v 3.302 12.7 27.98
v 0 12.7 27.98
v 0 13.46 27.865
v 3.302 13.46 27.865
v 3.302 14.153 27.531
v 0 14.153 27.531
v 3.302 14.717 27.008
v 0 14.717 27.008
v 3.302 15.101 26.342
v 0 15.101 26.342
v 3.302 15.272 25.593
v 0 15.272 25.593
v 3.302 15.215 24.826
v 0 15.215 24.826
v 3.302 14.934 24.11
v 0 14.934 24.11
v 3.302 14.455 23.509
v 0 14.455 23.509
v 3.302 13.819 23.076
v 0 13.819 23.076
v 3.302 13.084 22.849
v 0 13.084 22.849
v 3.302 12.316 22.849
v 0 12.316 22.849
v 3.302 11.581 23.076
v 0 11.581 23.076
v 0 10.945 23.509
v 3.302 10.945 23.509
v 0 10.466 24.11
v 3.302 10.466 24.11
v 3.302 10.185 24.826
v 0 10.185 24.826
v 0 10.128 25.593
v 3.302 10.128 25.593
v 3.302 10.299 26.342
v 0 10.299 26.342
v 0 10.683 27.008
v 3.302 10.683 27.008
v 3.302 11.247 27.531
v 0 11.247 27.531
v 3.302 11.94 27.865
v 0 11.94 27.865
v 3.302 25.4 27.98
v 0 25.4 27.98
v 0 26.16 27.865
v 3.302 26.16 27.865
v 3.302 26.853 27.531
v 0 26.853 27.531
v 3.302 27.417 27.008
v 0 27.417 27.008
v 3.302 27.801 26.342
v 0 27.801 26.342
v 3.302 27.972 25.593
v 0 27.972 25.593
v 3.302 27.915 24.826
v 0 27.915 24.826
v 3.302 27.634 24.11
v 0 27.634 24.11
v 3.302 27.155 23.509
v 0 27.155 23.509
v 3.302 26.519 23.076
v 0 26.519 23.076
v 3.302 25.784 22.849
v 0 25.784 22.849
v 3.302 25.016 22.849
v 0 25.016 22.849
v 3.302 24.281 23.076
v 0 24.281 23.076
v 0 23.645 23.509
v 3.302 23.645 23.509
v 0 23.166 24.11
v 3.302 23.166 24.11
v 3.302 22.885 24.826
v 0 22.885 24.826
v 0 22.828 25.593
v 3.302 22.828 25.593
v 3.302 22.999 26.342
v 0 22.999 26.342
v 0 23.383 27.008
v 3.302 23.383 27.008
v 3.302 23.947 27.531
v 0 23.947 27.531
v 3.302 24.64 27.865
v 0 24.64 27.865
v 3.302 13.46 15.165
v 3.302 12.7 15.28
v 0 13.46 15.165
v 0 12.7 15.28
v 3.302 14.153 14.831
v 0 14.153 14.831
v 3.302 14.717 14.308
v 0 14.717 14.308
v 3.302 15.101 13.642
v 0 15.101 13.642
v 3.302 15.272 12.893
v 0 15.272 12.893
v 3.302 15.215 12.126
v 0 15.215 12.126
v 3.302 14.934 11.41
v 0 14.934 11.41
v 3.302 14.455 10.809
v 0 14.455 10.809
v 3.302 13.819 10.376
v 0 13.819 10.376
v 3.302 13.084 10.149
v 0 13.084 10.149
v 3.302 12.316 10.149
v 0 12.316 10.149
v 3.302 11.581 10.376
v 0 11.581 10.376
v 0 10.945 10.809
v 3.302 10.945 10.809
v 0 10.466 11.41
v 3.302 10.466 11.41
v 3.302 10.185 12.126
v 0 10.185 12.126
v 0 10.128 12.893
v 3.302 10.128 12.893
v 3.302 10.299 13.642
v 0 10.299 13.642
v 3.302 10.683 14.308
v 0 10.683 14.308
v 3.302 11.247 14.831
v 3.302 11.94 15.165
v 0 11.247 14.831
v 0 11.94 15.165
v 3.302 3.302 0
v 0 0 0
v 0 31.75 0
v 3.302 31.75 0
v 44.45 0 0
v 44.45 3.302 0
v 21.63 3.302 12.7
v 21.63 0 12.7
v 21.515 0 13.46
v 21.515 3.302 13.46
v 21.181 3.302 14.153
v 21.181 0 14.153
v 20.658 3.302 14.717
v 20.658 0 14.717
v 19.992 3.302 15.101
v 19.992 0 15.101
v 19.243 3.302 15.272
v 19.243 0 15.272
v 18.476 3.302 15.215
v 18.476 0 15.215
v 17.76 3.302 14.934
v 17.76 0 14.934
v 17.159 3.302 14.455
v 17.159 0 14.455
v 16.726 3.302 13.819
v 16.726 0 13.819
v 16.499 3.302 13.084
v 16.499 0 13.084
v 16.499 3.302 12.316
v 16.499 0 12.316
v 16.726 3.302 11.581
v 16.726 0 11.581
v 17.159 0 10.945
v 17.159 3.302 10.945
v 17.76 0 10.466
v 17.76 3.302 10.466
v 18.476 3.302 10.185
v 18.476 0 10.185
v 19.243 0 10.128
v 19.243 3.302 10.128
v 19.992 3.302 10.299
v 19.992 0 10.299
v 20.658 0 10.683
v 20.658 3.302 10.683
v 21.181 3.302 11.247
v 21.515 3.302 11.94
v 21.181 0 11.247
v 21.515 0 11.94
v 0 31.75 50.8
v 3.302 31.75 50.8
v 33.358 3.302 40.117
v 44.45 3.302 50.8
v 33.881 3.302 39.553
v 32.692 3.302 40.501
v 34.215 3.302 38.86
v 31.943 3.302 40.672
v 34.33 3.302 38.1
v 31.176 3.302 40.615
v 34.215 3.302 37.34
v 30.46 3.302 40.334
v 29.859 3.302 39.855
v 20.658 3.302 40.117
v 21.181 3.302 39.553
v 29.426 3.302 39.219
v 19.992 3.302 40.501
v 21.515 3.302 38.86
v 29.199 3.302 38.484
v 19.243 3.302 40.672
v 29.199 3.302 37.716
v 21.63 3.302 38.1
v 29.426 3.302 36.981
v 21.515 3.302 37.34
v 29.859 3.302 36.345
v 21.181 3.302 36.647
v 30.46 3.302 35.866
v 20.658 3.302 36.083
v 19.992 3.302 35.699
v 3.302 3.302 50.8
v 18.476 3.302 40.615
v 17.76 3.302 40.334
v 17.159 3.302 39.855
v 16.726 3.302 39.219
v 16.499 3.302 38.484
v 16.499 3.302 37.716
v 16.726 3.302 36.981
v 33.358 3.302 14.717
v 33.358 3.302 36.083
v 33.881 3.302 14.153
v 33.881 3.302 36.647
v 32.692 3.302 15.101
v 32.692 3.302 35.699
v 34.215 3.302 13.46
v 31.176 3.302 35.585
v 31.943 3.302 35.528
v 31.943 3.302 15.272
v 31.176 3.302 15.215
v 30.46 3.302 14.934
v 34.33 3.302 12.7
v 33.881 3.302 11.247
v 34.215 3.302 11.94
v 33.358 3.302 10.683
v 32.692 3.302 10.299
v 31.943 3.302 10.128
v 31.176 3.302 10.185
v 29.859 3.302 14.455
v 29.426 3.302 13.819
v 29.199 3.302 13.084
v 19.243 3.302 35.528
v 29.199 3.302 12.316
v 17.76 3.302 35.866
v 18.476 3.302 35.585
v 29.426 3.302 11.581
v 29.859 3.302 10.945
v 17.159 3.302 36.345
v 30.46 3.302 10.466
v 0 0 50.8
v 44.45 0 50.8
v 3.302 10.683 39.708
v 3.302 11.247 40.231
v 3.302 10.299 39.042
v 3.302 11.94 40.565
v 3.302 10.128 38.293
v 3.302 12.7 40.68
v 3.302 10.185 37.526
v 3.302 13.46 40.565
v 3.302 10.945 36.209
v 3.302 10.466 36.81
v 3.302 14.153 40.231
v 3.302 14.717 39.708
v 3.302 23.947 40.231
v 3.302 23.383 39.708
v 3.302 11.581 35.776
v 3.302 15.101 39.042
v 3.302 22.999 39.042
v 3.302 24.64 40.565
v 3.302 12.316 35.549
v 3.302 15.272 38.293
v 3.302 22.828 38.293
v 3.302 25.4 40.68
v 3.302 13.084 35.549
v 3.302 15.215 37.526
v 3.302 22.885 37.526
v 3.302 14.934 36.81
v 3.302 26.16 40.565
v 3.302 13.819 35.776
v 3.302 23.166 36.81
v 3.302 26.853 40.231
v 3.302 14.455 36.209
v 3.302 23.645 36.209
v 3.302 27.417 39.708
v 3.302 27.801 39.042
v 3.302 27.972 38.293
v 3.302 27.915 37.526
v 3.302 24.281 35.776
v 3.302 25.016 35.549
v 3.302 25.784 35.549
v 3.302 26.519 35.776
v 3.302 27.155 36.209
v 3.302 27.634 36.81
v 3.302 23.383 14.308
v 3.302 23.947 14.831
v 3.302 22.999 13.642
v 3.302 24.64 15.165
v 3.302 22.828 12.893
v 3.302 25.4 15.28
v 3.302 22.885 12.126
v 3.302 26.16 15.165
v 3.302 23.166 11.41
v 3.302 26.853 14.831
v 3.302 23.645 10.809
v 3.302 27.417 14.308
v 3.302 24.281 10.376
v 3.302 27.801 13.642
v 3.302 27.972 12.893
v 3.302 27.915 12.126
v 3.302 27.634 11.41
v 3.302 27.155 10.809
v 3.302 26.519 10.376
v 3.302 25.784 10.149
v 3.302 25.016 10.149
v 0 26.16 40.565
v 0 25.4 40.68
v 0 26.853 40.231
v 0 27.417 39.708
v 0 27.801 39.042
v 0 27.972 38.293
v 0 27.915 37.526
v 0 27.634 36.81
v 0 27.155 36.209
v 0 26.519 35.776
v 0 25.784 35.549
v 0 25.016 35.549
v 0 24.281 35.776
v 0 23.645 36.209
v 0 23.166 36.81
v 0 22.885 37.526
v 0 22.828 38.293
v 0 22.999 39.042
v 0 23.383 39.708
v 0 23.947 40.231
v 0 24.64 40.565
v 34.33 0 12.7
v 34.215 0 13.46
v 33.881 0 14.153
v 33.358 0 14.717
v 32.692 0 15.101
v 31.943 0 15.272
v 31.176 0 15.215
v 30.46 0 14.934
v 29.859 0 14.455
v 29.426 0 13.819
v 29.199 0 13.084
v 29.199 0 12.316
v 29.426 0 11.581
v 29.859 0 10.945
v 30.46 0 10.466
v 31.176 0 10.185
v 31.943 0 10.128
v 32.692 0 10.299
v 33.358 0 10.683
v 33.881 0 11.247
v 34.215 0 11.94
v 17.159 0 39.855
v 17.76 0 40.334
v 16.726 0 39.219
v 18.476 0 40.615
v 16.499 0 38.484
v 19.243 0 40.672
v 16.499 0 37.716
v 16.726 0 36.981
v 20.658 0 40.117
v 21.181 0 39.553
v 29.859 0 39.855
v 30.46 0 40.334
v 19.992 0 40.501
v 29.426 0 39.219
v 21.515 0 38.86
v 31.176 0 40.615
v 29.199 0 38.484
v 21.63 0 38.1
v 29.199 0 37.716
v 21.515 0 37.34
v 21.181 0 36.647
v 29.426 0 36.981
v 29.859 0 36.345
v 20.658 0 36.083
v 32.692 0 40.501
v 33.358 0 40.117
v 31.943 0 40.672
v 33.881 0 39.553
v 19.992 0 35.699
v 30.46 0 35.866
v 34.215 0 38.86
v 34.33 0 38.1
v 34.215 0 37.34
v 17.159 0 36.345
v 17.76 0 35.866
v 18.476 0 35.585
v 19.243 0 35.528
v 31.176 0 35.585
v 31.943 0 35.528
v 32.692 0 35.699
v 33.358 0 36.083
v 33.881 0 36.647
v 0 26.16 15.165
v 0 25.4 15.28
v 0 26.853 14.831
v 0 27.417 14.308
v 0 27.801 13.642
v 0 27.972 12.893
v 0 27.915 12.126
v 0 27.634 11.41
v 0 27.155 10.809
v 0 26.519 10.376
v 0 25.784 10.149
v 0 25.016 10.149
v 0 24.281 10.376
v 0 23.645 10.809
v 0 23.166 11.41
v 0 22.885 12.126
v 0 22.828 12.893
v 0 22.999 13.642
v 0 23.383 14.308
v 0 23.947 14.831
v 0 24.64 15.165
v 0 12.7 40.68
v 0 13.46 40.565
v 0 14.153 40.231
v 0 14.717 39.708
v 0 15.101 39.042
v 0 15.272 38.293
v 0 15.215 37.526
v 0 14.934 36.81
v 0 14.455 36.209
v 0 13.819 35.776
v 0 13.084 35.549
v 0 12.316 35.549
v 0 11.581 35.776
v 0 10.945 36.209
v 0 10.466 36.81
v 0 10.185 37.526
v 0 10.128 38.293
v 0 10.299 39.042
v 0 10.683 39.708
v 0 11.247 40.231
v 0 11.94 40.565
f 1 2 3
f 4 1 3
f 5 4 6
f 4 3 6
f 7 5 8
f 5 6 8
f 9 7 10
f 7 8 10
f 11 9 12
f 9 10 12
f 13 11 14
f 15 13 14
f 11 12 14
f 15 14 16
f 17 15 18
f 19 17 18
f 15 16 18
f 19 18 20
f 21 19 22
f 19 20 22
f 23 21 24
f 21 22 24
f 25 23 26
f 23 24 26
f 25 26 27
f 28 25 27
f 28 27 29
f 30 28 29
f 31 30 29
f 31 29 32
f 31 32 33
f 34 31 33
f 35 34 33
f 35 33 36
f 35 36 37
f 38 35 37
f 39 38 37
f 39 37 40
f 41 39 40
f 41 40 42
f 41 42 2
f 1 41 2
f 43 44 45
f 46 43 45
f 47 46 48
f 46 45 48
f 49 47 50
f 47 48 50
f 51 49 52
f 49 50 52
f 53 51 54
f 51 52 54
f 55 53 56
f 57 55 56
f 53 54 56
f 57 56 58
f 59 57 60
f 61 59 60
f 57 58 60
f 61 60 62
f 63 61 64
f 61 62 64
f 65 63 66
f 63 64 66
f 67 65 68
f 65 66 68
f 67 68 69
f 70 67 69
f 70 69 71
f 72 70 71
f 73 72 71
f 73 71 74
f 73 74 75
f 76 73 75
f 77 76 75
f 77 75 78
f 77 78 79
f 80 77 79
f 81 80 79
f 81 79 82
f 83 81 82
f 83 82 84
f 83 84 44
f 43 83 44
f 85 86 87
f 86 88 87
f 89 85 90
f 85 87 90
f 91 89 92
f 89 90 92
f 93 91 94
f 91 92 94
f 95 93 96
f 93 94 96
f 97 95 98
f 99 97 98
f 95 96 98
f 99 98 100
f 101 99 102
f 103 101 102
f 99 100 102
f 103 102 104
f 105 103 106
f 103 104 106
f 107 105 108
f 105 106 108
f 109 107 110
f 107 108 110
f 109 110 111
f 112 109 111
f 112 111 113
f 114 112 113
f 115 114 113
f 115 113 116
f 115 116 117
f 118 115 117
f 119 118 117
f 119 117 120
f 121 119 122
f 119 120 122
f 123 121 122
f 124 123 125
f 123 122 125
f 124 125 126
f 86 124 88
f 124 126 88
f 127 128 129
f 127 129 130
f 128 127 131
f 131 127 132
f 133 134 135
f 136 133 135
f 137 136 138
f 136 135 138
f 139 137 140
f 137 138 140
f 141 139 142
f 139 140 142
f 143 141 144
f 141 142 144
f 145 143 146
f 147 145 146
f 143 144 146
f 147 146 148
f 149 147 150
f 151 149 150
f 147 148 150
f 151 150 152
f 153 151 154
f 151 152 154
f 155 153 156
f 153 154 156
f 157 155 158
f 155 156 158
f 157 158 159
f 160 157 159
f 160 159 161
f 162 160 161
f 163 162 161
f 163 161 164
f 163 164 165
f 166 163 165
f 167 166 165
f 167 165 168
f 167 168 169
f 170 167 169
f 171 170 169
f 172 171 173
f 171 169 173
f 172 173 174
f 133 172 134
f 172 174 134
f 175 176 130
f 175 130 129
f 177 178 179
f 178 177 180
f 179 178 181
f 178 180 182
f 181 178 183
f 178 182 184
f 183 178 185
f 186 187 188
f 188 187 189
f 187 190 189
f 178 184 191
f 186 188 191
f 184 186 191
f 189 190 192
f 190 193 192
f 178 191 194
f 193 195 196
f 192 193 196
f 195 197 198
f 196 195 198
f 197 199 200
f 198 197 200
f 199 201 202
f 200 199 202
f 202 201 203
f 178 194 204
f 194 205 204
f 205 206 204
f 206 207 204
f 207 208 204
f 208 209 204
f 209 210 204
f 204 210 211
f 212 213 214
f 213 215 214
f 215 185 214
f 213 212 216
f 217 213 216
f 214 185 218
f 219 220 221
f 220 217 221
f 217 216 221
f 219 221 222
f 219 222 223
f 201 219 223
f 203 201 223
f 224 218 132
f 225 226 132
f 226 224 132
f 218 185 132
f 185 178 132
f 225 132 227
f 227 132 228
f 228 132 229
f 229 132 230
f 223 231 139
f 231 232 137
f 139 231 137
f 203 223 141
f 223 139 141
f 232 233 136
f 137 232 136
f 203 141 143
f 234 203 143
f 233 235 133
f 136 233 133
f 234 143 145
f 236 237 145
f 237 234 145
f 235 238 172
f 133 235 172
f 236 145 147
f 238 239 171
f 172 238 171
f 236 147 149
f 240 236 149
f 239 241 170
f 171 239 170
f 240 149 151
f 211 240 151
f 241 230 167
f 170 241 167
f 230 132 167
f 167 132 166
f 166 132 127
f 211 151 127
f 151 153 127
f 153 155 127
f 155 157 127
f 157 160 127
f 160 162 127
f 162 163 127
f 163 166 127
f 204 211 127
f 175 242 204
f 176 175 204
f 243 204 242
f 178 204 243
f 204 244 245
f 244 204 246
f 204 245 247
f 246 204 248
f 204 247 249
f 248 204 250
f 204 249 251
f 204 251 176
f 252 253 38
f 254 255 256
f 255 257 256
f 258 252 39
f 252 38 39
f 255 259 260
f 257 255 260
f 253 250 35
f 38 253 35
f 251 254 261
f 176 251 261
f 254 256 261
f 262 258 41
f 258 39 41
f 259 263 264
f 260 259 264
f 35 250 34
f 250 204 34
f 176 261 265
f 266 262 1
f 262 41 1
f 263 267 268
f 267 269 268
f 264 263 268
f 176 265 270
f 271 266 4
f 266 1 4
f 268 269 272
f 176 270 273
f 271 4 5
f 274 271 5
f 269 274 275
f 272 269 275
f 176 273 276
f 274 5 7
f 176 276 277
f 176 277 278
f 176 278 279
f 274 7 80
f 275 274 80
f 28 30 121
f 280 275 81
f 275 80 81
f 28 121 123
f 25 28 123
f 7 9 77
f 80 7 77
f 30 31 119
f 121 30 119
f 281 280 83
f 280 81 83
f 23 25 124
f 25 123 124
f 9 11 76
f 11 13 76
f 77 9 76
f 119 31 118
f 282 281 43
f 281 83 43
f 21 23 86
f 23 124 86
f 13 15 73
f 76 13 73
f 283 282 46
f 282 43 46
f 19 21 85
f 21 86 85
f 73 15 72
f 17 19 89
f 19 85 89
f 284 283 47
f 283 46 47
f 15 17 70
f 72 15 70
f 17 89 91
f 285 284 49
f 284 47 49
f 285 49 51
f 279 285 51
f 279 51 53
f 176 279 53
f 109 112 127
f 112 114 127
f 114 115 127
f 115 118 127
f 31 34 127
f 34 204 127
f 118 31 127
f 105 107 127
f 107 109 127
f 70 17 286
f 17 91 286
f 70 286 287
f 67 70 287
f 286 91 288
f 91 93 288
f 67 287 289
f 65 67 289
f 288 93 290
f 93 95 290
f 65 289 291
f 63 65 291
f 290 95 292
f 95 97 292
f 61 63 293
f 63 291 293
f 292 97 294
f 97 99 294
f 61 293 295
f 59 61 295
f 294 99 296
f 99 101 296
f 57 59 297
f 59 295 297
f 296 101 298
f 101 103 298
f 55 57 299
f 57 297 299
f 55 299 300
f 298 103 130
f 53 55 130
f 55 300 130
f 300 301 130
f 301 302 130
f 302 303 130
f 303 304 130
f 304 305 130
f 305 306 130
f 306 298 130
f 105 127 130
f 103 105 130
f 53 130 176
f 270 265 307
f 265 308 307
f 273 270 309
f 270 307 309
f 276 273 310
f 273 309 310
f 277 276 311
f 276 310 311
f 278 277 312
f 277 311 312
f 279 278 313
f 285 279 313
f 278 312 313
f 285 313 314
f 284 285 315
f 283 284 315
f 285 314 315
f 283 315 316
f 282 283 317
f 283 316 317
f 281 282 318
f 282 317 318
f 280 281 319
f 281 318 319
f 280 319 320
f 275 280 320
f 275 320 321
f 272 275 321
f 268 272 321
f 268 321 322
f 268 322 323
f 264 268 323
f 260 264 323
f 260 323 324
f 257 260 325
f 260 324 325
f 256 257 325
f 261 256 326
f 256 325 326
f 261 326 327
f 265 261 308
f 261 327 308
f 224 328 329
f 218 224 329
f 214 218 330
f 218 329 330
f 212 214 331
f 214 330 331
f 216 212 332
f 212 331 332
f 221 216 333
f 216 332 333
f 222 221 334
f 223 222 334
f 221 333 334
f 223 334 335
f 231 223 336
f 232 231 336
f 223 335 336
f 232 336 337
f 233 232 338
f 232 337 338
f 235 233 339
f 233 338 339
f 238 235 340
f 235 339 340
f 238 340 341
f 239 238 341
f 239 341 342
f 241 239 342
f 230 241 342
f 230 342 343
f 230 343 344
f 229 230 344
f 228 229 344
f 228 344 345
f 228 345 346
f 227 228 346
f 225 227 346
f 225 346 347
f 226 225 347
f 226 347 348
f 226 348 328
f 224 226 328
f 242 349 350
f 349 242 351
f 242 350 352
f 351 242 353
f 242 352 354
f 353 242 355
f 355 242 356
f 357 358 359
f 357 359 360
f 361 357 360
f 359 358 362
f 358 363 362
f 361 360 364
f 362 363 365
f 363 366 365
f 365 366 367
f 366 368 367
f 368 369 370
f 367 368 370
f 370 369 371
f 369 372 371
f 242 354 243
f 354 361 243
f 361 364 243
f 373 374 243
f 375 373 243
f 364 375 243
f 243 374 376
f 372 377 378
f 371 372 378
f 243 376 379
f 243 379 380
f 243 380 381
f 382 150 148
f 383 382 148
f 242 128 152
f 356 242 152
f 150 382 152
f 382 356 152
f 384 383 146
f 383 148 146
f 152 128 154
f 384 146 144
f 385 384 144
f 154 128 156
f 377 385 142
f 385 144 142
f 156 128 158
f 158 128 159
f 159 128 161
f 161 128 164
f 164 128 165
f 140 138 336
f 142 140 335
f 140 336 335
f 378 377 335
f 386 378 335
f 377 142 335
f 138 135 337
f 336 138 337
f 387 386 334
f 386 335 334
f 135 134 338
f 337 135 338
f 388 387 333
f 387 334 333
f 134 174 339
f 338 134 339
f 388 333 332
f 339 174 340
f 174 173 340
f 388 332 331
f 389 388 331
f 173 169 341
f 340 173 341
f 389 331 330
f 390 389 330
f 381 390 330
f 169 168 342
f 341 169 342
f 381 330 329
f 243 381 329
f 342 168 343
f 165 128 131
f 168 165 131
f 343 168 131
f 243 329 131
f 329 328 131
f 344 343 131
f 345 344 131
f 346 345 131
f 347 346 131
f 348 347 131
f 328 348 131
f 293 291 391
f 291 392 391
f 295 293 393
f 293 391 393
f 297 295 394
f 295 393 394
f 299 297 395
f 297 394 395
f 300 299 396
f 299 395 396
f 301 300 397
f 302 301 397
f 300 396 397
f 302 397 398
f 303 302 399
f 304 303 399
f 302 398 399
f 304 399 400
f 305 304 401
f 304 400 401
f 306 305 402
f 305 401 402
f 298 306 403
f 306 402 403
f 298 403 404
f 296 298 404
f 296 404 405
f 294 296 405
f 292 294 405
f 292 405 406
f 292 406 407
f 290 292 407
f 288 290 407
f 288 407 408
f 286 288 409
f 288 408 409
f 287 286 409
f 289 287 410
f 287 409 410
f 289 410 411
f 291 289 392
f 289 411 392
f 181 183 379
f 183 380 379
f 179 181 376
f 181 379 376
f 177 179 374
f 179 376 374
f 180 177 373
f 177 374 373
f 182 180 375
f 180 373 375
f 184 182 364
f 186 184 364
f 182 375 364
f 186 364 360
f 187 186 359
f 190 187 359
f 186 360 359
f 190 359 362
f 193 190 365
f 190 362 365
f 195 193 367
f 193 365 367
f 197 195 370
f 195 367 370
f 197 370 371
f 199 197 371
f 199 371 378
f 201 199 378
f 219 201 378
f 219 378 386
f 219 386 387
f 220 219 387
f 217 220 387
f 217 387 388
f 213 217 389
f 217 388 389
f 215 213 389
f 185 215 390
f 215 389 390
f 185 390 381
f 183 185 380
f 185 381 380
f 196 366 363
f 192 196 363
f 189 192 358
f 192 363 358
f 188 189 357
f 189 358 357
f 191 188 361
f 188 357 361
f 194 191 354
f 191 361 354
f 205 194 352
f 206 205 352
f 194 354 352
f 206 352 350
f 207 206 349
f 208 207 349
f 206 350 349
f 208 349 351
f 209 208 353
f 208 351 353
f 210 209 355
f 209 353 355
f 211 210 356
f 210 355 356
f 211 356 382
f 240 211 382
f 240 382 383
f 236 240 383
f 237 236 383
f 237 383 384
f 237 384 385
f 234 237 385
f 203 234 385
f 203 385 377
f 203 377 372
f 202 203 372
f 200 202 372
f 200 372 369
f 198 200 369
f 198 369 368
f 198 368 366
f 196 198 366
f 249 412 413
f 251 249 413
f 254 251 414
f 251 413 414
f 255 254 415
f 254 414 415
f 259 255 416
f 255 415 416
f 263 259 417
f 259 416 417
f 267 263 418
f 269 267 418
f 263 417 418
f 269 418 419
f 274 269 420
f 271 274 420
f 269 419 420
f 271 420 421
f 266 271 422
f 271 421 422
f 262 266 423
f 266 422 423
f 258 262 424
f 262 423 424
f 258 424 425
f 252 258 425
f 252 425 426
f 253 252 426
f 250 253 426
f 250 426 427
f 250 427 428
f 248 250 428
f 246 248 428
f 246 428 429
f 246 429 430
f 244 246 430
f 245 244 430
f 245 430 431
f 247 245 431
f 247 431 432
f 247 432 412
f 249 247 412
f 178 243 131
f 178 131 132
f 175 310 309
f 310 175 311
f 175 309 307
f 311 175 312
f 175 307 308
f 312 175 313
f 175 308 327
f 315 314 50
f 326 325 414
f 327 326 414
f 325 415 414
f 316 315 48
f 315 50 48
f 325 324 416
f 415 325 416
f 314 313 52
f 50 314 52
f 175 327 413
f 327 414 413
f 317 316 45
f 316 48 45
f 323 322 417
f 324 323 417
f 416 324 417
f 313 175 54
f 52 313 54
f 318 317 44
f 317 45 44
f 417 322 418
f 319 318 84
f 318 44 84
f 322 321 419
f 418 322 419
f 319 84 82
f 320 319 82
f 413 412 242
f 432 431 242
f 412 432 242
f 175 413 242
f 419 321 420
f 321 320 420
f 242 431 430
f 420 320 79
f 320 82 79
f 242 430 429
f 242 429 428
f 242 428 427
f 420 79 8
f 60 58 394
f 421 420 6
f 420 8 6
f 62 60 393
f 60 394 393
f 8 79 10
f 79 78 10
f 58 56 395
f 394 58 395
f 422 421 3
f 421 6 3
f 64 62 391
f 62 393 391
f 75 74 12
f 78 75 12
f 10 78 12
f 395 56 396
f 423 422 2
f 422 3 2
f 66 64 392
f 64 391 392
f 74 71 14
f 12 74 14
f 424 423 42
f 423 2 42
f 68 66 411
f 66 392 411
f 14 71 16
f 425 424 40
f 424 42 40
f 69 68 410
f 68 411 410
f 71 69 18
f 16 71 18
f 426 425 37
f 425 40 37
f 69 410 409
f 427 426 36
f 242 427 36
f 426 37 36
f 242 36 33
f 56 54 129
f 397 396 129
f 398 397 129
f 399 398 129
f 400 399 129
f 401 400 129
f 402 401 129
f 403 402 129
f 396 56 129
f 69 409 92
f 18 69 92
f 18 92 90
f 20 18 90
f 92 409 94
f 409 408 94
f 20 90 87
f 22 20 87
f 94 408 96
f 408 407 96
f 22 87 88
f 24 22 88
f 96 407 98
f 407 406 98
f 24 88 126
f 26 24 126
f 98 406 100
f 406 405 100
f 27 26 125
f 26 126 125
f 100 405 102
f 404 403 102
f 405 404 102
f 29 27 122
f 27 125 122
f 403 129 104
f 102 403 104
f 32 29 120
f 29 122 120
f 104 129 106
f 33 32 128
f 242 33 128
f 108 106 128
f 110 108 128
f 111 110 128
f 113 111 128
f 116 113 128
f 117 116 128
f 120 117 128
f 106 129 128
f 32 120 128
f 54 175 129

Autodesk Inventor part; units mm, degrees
ref_plane "YZ Plane" through (0, 0, 0) normal (1, 0, 0) x (0, 1, 0)
ref_plane "XZ Plane" through (0, 0, 0) normal (0, 1, 0) x (-1, 0, 0)
ref_plane "XY Plane" through (0, 0, 0) normal (0, 0, 1) x (1, 0, 0)
sketch "Sketch1" plane through (0, 0, 0) normal (0, 0, 1) x (1, 0, 0)
  line L0 (0, 0) -> (44.45, 0)
  line L1 (44.45, 0) -> (44.45, 3.302)
  line L2 (44.45, 3.302) -> (3.302, 3.302)
  line L3 (0, 31.75) -> (0, 0)
  line L4 (3.302, 3.302) -> (3.302, 31.75)
  line L5 (3.302, 31.75) -> (0, 31.75)
  line L6 (0, 31.75) -> (0, 0)
  point P0 (0, 3.302)
  dimension "d1" = 3.302
  dimension "d2" = 3.302
  dimension "d50" = 44.45
  dimension "d57" = 31.75
extrude "Extrusion1" add sketch "Sketch1" along normal blind 50.8
sketch "Sketch3" plane through (0, 0, 0) normal (-1, 0, 0) x (0, 0, 1)
  line L0 (0, 0) -> (50.8, 0) construction
  line L1 (0, 0) -> (12.7, 0) construction
  line L2 (12.7, 0) -> (25.4, 0) construction
  line L3 (25.4, 0) -> (38.1, 0) construction
  line L4 (38.1, 0) -> (38.1, 12.7) construction
  line L5 (38.1, 12.7) -> (38.1, 25.4) construction
  line L6 (25.4, 0) -> (25.4, 12.7) construction
  line L7 (25.4, 12.7) -> (25.4, 25.4) construction
  line L8 (12.7, 0) -> (12.7, 12.7) construction
  line L9 (12.7, 12.7) -> (12.7, 25.4) construction
  circle A0 centre (12.7, 25.4) radius 2.5797
  circle A1 centre (25.4, 25.4) radius 2.5797
  circle A2 centre (38.1, 25.4) radius 2.5797
  circle A3 centre (38.1, 12.7) radius 2.5797
  circle A4 centre (25.4, 12.7) radius 2.5797
  circle A5 centre (12.7, 12.7) radius 2.5797
  dimension "d9" = 12.7
  dimension "d10" = 12.7
  dimension "d11" = 12.7
  dimension "d12" = 12.7
  dimension "d13" = 12.7
  dimension "d14" = 12.7
  dimension "d15" = 12.7
  dimension "d16" = 12.7
  dimension "d17" = 12.7
  dimension "d18" = 5.1594
  dimension "d19" = 5.1594
  dimension "d20" = 5.1594
  dimension "d21" = 5.1594
  dimension "d22" = 5.1594
  dimension "d23" = 5.1594
extrude "Extrusion3" cut sketch "Sketch3" against normal blind 50.8
sketch "Sketch4" plane through (0, 0, 0) normal (0, -1, 0) x (1, 0, 0)
  line L0 (44.45, 0) -> (44.45, 50.8) construction
  line L1 (44.45, 50.8) -> (44.45, 38.1) construction
  line L2 (50.8, 38.1) -> (44.45, 38.1) construction
  line L3 (44.45, 38.1) -> (31.75, 38.1) construction
  line L4 (31.75, 38.1) -> (19.05, 38.1) construction
  line L5 (44.45, 0) -> (44.45, 13.462) construction
  circle A0 centre (31.75, 38.1) radius 2.5797
  circle A1 centre (19.05, 38.1) radius 2.5797
  line L6 (50.8, 12.7) -> (44.45, 12.7) construction
  line L7 (44.45, 12.7) -> (31.75, 12.7) construction
  line L8 (31.75, 12.7) -> (19.05, 12.7) construction
  line L9 (19.05, 12.7) -> (6.35, 12.7) construction
  circle A2 centre (31.75, 12.7) radius 2.5797
  circle A3 centre (19.05, 12.7) radius 2.5797
  line L10 (44.45, 13.462) -> (38.1, 13.462) construction
  line L11 (44.45, 12.7) -> (44.45, 17.4414) construction
  line L12 (19.05, 38.1) -> (6.35, 38.1) construction
  point P0 (0, 0)
  dimension "d26" = 12.7
  dimension "d27" = 6.35
  dimension "d28" = 12.7
  dimension "d29" = 12.7
  dimension "d31" = 13.462
  dimension "d33" = 5.1594
  dimension "d34" = 5.1594
  dimension "d37" = 6.35
  dimension "d38" = 12.7
  dimension "d39" = 12.7
  dimension "d40" = 12.7
  dimension "d42" = 5.1594
  dimension "d43" = 5.1594
  dimension "d53" = 12.7
extrude "Extrusion7" cut sketch "Sketch4" against normal blind 25.4
properties part number "2in bracket"
